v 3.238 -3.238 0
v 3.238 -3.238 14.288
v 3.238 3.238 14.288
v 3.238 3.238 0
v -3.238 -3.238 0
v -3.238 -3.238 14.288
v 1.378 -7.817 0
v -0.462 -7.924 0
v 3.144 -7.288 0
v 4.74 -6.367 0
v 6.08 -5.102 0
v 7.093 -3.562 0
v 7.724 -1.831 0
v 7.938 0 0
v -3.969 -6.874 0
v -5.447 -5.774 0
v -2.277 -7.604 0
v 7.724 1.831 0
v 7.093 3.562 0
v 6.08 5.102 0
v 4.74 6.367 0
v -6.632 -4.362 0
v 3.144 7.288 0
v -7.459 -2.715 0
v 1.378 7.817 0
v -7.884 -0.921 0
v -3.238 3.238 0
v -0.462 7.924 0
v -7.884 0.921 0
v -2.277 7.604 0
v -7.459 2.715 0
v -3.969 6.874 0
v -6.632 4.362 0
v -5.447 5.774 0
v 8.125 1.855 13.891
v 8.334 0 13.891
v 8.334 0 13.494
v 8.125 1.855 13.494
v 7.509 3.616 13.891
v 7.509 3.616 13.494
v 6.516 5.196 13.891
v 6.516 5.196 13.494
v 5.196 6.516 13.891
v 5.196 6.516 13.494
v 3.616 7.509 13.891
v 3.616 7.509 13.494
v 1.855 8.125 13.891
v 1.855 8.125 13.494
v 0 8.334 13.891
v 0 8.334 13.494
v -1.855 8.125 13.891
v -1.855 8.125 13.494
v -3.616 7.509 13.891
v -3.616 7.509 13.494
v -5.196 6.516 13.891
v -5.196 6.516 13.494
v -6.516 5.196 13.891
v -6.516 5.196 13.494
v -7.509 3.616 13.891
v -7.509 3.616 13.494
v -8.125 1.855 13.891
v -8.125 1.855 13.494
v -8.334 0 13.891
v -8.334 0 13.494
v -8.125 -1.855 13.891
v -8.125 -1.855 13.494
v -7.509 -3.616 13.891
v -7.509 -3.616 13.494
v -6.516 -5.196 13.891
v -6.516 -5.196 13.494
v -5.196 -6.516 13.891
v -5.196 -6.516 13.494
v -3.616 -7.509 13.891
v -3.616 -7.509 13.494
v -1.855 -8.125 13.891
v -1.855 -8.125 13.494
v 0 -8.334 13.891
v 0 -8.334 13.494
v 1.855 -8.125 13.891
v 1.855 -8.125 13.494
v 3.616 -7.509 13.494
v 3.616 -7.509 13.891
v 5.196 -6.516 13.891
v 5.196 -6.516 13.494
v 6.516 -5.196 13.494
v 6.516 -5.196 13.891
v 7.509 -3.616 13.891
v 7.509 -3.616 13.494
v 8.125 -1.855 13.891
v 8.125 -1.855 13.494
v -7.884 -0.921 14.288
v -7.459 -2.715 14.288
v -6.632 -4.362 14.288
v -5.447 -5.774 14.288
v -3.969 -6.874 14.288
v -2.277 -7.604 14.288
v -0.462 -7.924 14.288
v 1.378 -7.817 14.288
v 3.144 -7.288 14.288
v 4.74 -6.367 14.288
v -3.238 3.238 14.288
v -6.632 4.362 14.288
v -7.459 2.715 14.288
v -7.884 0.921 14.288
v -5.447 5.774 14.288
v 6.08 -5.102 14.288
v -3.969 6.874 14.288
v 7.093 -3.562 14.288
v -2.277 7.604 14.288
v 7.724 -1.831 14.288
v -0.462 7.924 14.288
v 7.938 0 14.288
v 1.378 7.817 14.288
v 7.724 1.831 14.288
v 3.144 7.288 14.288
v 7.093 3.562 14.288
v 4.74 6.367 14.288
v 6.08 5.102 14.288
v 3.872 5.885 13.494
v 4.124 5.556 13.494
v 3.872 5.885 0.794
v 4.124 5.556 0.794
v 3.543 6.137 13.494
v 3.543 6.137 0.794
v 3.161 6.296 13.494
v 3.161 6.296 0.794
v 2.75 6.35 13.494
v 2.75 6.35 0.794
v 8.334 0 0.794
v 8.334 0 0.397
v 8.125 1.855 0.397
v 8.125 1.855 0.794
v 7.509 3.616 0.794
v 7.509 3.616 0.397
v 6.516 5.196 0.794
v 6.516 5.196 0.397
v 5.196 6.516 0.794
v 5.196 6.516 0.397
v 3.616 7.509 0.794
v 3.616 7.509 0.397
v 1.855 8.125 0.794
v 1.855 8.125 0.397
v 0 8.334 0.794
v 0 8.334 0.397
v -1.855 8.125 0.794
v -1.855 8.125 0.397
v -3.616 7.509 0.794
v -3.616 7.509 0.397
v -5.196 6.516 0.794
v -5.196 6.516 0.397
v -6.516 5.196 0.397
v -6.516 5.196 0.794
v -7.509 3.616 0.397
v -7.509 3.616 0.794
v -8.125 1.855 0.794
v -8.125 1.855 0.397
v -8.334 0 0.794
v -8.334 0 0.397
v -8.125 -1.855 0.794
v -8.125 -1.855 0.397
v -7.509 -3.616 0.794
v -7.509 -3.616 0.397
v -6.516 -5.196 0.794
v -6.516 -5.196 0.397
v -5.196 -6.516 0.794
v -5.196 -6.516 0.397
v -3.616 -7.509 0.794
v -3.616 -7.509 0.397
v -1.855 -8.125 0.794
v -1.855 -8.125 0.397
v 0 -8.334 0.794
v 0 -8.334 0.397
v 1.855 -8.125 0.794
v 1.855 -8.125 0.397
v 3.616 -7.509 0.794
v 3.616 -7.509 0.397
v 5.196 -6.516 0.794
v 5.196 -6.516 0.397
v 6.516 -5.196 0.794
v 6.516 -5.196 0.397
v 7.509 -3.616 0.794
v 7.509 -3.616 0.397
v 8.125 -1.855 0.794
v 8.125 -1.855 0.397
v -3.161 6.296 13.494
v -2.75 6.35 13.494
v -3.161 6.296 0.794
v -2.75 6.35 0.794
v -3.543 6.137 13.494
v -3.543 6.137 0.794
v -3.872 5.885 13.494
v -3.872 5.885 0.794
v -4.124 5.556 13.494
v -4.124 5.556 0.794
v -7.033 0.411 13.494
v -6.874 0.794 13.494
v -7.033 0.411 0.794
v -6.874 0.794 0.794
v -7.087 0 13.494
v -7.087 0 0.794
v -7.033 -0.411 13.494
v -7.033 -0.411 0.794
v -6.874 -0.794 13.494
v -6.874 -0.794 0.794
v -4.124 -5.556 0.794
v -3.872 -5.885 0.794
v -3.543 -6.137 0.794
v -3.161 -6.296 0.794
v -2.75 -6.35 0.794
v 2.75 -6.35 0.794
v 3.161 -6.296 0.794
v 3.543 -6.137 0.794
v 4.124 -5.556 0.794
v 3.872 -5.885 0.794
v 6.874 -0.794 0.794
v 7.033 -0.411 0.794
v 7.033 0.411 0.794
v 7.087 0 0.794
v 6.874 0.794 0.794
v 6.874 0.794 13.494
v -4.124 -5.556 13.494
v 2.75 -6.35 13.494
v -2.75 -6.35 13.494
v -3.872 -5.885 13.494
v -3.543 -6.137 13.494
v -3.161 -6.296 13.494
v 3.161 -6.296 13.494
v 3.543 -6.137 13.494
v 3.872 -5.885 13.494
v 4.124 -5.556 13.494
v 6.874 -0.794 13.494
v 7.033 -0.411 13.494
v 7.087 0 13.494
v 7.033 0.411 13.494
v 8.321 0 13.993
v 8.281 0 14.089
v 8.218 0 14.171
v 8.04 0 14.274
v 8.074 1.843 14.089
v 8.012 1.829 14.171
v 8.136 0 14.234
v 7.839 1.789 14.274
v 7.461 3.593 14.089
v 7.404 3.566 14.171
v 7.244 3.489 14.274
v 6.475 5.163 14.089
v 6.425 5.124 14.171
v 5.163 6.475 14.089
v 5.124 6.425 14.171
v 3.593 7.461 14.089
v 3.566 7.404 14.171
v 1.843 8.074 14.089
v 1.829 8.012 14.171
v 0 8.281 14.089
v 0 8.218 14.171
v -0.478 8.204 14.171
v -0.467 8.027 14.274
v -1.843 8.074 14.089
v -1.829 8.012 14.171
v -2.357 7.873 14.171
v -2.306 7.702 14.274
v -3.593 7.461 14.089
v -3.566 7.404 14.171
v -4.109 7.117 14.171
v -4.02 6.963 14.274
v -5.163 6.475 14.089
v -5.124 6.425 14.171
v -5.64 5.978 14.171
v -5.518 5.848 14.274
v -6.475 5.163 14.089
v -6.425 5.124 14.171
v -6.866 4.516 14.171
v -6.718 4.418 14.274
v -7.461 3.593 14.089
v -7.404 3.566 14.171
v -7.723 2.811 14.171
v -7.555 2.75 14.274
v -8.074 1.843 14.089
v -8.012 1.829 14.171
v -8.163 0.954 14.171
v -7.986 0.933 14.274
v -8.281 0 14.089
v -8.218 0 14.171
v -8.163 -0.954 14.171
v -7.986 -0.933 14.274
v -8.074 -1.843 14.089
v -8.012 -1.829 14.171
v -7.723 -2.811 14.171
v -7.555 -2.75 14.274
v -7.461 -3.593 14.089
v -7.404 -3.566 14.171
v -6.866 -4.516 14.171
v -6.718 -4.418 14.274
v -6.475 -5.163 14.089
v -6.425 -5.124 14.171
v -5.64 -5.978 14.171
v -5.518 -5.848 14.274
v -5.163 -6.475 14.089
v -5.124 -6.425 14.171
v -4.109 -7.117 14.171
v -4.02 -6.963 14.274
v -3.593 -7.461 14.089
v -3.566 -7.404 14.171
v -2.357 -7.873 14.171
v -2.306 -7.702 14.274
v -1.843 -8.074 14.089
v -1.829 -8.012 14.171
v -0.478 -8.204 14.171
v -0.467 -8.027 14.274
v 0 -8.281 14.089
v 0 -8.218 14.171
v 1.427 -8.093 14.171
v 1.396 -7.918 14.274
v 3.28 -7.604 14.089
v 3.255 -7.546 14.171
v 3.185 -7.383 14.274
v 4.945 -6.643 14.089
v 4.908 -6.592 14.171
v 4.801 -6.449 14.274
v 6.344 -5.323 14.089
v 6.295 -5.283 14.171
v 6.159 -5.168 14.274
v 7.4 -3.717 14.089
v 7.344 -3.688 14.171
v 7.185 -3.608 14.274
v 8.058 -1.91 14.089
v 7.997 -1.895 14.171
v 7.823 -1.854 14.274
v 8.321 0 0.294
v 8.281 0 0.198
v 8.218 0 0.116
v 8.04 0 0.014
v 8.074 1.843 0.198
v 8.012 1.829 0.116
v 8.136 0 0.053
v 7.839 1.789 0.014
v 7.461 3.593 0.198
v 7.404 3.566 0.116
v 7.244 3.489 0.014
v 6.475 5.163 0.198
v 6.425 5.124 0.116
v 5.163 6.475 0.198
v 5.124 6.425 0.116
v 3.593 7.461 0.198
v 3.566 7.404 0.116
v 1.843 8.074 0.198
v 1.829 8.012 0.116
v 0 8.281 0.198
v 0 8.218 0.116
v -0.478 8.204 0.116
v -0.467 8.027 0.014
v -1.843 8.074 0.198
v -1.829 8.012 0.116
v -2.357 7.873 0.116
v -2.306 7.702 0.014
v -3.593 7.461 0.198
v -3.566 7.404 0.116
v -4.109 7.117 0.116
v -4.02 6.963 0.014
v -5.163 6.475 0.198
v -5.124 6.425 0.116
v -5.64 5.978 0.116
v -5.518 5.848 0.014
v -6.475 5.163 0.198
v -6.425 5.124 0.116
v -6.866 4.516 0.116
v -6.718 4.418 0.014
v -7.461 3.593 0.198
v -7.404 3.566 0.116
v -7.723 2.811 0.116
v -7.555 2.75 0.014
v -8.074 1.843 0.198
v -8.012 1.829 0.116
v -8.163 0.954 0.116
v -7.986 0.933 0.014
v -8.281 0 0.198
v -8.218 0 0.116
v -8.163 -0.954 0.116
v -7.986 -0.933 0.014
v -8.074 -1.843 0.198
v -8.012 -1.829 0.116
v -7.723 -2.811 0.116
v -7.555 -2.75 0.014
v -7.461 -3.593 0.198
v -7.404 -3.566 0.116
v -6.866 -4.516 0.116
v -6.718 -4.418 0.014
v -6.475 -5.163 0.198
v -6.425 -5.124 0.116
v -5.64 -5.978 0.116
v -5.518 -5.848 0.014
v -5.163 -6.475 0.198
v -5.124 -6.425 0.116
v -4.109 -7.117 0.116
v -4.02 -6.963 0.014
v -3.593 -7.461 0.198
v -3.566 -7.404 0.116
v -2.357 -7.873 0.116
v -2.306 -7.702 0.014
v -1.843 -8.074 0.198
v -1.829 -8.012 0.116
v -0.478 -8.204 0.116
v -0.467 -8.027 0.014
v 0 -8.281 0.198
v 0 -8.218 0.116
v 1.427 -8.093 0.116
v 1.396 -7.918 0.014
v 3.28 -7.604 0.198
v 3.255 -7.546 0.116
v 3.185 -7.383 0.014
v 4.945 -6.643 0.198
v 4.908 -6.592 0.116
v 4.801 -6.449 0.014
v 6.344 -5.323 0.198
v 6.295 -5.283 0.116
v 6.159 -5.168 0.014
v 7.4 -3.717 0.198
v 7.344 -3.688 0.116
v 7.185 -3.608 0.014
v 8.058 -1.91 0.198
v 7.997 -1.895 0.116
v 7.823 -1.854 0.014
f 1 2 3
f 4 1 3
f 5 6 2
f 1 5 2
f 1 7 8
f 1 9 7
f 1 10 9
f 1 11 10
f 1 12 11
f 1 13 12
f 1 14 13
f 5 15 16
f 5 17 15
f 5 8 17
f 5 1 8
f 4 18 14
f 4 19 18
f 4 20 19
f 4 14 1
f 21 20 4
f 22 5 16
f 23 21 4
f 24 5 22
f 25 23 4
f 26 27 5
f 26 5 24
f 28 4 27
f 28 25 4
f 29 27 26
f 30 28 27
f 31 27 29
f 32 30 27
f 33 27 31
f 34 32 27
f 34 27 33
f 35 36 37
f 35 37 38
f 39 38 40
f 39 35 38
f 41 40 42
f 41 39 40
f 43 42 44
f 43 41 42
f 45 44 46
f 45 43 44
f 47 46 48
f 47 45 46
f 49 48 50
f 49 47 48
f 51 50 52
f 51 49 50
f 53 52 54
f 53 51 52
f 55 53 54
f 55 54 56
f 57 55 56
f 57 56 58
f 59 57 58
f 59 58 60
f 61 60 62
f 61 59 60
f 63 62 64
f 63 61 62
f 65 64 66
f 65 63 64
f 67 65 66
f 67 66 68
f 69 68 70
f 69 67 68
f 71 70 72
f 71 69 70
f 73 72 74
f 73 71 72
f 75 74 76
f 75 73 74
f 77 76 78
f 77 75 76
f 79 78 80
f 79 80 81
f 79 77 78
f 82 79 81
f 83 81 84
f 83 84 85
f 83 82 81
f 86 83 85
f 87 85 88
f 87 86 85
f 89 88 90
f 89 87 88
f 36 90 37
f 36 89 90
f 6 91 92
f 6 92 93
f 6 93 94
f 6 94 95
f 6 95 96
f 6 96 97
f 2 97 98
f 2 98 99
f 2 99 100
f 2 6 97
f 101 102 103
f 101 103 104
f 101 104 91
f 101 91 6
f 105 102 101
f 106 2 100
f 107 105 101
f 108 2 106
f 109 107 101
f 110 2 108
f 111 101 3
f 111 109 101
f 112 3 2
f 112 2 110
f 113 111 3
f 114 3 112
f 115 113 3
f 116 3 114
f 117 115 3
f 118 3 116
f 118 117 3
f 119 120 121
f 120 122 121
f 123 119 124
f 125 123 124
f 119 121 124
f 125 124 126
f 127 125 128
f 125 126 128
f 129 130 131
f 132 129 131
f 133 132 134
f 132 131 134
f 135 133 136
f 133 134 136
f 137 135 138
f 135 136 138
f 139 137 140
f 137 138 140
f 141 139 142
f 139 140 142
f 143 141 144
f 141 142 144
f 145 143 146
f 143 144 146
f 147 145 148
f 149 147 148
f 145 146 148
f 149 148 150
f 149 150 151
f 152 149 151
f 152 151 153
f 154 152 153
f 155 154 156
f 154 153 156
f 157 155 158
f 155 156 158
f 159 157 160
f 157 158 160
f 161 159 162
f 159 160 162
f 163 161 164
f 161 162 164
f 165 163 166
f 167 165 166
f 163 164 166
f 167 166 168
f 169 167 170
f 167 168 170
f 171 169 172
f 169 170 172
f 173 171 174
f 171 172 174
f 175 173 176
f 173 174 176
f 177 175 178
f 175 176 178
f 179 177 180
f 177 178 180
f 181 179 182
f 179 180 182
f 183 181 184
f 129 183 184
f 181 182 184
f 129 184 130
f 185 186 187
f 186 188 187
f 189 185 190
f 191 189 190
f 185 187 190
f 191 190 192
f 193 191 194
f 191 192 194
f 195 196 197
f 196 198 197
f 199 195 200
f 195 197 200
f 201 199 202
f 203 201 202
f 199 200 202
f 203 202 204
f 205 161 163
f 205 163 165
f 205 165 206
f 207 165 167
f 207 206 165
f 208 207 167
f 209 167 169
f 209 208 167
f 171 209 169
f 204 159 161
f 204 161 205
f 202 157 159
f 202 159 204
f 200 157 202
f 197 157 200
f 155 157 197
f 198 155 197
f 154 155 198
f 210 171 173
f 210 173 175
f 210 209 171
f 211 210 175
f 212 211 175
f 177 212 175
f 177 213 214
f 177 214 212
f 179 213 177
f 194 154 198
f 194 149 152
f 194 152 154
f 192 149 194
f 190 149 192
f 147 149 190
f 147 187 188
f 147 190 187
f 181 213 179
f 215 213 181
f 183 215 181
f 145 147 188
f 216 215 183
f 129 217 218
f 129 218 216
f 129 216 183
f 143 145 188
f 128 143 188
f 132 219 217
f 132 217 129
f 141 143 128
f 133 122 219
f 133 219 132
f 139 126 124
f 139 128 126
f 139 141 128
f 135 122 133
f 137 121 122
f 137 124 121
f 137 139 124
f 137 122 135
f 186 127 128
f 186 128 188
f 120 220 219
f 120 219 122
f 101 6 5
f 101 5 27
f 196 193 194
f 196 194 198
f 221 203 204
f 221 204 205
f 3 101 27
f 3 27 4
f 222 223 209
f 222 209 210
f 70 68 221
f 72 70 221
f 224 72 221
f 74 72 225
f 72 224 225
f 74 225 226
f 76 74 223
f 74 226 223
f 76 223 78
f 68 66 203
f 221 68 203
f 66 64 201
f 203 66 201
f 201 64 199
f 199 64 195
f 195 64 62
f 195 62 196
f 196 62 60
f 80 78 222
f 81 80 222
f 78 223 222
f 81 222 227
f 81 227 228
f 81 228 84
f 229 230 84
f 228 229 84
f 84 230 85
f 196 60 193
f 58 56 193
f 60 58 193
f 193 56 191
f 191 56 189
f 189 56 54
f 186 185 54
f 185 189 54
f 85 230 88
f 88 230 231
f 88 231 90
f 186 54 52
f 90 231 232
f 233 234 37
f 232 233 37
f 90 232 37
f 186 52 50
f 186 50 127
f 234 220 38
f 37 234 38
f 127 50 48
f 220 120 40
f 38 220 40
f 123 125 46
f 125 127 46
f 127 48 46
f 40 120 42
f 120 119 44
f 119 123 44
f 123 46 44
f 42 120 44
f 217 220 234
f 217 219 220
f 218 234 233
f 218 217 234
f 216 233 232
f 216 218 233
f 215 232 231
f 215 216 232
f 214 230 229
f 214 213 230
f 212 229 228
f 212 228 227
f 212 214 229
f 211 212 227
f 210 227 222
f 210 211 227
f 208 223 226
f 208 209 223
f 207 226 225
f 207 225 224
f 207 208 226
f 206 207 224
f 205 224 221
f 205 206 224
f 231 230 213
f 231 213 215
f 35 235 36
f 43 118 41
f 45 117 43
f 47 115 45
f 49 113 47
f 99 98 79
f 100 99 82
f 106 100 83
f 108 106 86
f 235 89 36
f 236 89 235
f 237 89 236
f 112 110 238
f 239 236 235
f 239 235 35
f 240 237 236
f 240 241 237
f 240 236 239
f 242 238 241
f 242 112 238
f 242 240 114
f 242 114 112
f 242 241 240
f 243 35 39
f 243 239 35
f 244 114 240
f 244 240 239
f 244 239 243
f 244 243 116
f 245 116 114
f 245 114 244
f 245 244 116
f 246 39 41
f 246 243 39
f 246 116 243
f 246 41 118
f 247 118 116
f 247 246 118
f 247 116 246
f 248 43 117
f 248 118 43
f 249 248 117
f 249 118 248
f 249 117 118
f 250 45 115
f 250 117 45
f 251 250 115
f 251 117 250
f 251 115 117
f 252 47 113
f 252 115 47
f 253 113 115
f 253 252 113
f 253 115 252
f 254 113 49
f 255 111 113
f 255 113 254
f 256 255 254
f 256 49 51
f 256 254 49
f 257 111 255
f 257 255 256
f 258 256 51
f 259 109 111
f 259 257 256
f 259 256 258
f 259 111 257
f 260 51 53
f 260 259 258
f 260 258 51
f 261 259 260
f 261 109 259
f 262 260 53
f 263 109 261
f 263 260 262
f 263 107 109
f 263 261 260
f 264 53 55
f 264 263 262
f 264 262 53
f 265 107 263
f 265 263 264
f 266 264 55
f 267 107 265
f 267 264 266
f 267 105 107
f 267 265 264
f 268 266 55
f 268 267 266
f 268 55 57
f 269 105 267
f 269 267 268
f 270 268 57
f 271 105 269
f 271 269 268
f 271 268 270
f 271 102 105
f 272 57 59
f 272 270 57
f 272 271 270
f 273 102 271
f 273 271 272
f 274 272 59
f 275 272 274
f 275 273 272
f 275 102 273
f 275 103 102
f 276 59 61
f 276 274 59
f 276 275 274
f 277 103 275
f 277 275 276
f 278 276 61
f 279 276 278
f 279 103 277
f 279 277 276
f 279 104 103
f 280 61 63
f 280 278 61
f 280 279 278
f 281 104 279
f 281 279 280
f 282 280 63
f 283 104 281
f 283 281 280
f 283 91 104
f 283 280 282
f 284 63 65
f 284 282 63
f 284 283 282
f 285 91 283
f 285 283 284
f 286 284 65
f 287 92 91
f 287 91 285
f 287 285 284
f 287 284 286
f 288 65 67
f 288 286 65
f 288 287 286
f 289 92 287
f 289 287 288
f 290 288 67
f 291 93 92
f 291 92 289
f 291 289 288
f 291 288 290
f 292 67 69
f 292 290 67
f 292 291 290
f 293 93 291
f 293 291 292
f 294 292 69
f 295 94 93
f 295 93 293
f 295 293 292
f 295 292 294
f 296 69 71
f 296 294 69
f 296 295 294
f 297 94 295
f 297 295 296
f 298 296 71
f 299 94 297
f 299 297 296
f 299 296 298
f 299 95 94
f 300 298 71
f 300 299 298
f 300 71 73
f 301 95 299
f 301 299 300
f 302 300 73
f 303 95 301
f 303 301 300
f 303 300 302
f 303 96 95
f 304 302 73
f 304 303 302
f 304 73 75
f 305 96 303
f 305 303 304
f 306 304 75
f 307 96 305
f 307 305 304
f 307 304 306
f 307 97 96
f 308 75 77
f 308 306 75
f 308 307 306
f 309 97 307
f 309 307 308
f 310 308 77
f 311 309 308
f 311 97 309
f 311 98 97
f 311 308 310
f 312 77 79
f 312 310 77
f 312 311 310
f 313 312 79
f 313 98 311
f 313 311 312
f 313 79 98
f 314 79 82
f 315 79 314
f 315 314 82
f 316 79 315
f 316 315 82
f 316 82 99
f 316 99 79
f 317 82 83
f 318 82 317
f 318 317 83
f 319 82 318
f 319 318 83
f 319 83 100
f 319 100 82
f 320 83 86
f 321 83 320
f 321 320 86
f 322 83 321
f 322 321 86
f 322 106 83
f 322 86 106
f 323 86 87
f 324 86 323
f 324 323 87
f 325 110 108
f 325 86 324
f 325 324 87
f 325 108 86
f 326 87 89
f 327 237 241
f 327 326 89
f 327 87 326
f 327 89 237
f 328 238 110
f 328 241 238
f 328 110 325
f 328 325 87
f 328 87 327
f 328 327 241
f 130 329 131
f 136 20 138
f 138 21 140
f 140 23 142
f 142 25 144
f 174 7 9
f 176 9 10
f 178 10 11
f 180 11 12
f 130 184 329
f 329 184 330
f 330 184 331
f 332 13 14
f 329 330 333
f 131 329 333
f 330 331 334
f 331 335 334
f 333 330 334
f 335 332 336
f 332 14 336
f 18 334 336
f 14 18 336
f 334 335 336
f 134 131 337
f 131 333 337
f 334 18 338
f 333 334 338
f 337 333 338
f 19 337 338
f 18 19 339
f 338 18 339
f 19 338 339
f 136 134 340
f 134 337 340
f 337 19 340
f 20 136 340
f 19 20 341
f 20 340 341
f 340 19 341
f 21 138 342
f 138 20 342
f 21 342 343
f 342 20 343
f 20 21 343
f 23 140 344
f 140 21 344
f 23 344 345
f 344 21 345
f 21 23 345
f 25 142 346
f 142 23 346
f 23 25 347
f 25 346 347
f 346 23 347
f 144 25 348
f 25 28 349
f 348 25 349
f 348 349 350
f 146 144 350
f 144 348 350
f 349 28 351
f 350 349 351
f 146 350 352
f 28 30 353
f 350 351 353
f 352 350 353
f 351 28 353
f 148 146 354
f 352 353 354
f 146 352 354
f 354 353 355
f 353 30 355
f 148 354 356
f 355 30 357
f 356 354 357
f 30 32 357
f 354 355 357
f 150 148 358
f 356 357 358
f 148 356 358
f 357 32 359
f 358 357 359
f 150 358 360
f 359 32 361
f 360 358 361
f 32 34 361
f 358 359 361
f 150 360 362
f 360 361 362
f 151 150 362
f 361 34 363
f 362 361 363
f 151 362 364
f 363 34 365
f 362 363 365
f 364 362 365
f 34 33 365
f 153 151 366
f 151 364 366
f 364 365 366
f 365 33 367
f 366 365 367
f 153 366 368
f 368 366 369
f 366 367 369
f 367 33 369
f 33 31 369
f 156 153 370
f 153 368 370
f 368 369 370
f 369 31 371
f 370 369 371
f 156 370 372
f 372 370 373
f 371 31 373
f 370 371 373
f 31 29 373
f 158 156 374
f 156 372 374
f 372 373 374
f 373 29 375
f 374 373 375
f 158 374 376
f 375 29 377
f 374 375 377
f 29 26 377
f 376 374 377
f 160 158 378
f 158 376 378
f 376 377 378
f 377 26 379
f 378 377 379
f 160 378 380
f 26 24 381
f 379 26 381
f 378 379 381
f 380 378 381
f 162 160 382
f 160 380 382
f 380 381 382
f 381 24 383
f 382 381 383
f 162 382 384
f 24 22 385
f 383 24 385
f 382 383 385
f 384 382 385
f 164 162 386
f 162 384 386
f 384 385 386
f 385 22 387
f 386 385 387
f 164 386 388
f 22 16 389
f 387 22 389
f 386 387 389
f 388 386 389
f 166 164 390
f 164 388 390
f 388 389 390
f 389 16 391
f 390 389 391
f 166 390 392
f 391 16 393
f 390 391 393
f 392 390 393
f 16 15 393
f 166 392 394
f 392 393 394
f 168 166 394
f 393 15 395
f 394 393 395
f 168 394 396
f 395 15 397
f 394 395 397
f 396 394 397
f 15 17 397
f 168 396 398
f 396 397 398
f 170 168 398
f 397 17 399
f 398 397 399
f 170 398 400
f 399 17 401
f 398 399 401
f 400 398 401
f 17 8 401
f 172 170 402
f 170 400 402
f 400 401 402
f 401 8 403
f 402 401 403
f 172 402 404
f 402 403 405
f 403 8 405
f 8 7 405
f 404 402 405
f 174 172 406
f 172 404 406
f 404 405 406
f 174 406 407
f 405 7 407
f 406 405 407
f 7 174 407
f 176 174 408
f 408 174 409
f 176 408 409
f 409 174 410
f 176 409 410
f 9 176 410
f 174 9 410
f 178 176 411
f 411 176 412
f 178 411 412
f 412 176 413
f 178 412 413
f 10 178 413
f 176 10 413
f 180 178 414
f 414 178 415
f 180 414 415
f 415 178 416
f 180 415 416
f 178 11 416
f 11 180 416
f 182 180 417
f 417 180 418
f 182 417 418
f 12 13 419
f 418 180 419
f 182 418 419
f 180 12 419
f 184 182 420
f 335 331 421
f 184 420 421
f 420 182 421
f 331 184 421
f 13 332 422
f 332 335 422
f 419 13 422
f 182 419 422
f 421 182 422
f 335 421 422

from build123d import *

# Parameters (mm, degrees)
SKETCH1_R           = 8.334375
SKETCH1_W           = 6.477
SKETCH1_H           = 6.477
BOSS_EXTRUDE1_DEPTH = 0.79375
SKETCH2_W           = 6.477
SKETCH2_H           = 6.477
BOSS_EXTRUDE2_DEPTH = 6.35
SKETCH3_R           = 5.1435
CUT_EXTRUDE1_DEPTH  = 1.27
FILLET1_R           = 1.5875
FILLET2_R           = 0.396875
SKETCH5_R           = 5.1435
SKETCH5_W           = 6.477
SKETCH5_H           = 6.477
BOSS_EXTRUDE3_DEPTH = 1.27
BOSS_EXTRUDE4_START = 1.27
SKETCH6_R           = 5.1435
SKETCH6_W           = 6.477
SKETCH6_H           = 6.477
BOSS_EXTRUDE4_DEPTH = 1.27


with BuildPart() as part:
    # Sketch1 → Boss-Extrude1 (new body)
    with BuildSketch(Plane.XY):
        Circle(SKETCH1_R)
        Rectangle(SKETCH1_W, SKETCH1_H, mode=Mode.SUBTRACT)
    extrude(amount=BOSS_EXTRUDE1_DEPTH)

    # Sketch2 → Boss-Extrude2 (add)
    with BuildSketch(Plane.XY.offset(0.79375)):
        Polygon((7.332348419, 0), (3.666174209, 6.35), (-3.666174209, 6.35), (-7.332348419, 0), (-3.666174209, -6.35), (3.666174209, -6.35), align=None)
        Rectangle(SKETCH2_W, SKETCH2_H, mode=Mode.SUBTRACT)
    extrude(amount=BOSS_EXTRUDE2_DEPTH)

    # Sketch3 → Cut-Extrude1 (cut)
    with BuildSketch(Plane(origin=(0, 0, 0), x_dir=(-1, 0, 0), z_dir=(0, 0, -1))):
        Circle(SKETCH3_R)
    extrude(amount=-CUT_EXTRUDE1_DEPTH, mode=Mode.SUBTRACT)

    # Fillet1
    fillet1_edges = [part.edges().sort_by_distance(p)[0] for p in [
        (3.666174209, -6.35, 3.96875),
        (7.332348419, 0, 3.96875),
        (3.666174209, 6.35, 3.96875),
        (-3.666174209, 6.35, 3.96875),
        (-7.332348419, 0, 3.96875),
        (-3.666174209, -6.35, 3.96875),
    ]]
    fillet(fillet1_edges, radius=FILLET1_R)

    # Fillet2
    fillet2_edges = [part.edges().sort_by_distance(p)[0] for p in [
        (-8.334375, 0, 0),
    ]]
    fillet(fillet2_edges, radius=FILLET2_R)

    # Mirror1: part across plane


with BuildPart() as part_1:
    add(part.part)
    add(part.part.mirror(Plane.XY.offset(7.14375)))

    # Sketch5 → Boss-Extrude3 (add)
    with BuildSketch(Plane(origin=(0, 0, 1.27), x_dir=(-1, 0, 0), z_dir=(0, 0, -1))):
        Circle(SKETCH5_R)
        Rectangle(SKETCH5_W, SKETCH5_H, mode=Mode.SUBTRACT)
    extrude(amount=BOSS_EXTRUDE3_DEPTH)

    # Sketch6 → Boss-Extrude4 (add)
    with BuildSketch(Plane.XY.offset(13.0175).offset(BOSS_EXTRUDE4_START)):
        Circle(SKETCH6_R)
        Rectangle(SKETCH6_W, SKETCH6_H, mode=Mode.SUBTRACT)
    extrude(amount=-BOSS_EXTRUDE4_DEPTH)


solid = part_1.part
